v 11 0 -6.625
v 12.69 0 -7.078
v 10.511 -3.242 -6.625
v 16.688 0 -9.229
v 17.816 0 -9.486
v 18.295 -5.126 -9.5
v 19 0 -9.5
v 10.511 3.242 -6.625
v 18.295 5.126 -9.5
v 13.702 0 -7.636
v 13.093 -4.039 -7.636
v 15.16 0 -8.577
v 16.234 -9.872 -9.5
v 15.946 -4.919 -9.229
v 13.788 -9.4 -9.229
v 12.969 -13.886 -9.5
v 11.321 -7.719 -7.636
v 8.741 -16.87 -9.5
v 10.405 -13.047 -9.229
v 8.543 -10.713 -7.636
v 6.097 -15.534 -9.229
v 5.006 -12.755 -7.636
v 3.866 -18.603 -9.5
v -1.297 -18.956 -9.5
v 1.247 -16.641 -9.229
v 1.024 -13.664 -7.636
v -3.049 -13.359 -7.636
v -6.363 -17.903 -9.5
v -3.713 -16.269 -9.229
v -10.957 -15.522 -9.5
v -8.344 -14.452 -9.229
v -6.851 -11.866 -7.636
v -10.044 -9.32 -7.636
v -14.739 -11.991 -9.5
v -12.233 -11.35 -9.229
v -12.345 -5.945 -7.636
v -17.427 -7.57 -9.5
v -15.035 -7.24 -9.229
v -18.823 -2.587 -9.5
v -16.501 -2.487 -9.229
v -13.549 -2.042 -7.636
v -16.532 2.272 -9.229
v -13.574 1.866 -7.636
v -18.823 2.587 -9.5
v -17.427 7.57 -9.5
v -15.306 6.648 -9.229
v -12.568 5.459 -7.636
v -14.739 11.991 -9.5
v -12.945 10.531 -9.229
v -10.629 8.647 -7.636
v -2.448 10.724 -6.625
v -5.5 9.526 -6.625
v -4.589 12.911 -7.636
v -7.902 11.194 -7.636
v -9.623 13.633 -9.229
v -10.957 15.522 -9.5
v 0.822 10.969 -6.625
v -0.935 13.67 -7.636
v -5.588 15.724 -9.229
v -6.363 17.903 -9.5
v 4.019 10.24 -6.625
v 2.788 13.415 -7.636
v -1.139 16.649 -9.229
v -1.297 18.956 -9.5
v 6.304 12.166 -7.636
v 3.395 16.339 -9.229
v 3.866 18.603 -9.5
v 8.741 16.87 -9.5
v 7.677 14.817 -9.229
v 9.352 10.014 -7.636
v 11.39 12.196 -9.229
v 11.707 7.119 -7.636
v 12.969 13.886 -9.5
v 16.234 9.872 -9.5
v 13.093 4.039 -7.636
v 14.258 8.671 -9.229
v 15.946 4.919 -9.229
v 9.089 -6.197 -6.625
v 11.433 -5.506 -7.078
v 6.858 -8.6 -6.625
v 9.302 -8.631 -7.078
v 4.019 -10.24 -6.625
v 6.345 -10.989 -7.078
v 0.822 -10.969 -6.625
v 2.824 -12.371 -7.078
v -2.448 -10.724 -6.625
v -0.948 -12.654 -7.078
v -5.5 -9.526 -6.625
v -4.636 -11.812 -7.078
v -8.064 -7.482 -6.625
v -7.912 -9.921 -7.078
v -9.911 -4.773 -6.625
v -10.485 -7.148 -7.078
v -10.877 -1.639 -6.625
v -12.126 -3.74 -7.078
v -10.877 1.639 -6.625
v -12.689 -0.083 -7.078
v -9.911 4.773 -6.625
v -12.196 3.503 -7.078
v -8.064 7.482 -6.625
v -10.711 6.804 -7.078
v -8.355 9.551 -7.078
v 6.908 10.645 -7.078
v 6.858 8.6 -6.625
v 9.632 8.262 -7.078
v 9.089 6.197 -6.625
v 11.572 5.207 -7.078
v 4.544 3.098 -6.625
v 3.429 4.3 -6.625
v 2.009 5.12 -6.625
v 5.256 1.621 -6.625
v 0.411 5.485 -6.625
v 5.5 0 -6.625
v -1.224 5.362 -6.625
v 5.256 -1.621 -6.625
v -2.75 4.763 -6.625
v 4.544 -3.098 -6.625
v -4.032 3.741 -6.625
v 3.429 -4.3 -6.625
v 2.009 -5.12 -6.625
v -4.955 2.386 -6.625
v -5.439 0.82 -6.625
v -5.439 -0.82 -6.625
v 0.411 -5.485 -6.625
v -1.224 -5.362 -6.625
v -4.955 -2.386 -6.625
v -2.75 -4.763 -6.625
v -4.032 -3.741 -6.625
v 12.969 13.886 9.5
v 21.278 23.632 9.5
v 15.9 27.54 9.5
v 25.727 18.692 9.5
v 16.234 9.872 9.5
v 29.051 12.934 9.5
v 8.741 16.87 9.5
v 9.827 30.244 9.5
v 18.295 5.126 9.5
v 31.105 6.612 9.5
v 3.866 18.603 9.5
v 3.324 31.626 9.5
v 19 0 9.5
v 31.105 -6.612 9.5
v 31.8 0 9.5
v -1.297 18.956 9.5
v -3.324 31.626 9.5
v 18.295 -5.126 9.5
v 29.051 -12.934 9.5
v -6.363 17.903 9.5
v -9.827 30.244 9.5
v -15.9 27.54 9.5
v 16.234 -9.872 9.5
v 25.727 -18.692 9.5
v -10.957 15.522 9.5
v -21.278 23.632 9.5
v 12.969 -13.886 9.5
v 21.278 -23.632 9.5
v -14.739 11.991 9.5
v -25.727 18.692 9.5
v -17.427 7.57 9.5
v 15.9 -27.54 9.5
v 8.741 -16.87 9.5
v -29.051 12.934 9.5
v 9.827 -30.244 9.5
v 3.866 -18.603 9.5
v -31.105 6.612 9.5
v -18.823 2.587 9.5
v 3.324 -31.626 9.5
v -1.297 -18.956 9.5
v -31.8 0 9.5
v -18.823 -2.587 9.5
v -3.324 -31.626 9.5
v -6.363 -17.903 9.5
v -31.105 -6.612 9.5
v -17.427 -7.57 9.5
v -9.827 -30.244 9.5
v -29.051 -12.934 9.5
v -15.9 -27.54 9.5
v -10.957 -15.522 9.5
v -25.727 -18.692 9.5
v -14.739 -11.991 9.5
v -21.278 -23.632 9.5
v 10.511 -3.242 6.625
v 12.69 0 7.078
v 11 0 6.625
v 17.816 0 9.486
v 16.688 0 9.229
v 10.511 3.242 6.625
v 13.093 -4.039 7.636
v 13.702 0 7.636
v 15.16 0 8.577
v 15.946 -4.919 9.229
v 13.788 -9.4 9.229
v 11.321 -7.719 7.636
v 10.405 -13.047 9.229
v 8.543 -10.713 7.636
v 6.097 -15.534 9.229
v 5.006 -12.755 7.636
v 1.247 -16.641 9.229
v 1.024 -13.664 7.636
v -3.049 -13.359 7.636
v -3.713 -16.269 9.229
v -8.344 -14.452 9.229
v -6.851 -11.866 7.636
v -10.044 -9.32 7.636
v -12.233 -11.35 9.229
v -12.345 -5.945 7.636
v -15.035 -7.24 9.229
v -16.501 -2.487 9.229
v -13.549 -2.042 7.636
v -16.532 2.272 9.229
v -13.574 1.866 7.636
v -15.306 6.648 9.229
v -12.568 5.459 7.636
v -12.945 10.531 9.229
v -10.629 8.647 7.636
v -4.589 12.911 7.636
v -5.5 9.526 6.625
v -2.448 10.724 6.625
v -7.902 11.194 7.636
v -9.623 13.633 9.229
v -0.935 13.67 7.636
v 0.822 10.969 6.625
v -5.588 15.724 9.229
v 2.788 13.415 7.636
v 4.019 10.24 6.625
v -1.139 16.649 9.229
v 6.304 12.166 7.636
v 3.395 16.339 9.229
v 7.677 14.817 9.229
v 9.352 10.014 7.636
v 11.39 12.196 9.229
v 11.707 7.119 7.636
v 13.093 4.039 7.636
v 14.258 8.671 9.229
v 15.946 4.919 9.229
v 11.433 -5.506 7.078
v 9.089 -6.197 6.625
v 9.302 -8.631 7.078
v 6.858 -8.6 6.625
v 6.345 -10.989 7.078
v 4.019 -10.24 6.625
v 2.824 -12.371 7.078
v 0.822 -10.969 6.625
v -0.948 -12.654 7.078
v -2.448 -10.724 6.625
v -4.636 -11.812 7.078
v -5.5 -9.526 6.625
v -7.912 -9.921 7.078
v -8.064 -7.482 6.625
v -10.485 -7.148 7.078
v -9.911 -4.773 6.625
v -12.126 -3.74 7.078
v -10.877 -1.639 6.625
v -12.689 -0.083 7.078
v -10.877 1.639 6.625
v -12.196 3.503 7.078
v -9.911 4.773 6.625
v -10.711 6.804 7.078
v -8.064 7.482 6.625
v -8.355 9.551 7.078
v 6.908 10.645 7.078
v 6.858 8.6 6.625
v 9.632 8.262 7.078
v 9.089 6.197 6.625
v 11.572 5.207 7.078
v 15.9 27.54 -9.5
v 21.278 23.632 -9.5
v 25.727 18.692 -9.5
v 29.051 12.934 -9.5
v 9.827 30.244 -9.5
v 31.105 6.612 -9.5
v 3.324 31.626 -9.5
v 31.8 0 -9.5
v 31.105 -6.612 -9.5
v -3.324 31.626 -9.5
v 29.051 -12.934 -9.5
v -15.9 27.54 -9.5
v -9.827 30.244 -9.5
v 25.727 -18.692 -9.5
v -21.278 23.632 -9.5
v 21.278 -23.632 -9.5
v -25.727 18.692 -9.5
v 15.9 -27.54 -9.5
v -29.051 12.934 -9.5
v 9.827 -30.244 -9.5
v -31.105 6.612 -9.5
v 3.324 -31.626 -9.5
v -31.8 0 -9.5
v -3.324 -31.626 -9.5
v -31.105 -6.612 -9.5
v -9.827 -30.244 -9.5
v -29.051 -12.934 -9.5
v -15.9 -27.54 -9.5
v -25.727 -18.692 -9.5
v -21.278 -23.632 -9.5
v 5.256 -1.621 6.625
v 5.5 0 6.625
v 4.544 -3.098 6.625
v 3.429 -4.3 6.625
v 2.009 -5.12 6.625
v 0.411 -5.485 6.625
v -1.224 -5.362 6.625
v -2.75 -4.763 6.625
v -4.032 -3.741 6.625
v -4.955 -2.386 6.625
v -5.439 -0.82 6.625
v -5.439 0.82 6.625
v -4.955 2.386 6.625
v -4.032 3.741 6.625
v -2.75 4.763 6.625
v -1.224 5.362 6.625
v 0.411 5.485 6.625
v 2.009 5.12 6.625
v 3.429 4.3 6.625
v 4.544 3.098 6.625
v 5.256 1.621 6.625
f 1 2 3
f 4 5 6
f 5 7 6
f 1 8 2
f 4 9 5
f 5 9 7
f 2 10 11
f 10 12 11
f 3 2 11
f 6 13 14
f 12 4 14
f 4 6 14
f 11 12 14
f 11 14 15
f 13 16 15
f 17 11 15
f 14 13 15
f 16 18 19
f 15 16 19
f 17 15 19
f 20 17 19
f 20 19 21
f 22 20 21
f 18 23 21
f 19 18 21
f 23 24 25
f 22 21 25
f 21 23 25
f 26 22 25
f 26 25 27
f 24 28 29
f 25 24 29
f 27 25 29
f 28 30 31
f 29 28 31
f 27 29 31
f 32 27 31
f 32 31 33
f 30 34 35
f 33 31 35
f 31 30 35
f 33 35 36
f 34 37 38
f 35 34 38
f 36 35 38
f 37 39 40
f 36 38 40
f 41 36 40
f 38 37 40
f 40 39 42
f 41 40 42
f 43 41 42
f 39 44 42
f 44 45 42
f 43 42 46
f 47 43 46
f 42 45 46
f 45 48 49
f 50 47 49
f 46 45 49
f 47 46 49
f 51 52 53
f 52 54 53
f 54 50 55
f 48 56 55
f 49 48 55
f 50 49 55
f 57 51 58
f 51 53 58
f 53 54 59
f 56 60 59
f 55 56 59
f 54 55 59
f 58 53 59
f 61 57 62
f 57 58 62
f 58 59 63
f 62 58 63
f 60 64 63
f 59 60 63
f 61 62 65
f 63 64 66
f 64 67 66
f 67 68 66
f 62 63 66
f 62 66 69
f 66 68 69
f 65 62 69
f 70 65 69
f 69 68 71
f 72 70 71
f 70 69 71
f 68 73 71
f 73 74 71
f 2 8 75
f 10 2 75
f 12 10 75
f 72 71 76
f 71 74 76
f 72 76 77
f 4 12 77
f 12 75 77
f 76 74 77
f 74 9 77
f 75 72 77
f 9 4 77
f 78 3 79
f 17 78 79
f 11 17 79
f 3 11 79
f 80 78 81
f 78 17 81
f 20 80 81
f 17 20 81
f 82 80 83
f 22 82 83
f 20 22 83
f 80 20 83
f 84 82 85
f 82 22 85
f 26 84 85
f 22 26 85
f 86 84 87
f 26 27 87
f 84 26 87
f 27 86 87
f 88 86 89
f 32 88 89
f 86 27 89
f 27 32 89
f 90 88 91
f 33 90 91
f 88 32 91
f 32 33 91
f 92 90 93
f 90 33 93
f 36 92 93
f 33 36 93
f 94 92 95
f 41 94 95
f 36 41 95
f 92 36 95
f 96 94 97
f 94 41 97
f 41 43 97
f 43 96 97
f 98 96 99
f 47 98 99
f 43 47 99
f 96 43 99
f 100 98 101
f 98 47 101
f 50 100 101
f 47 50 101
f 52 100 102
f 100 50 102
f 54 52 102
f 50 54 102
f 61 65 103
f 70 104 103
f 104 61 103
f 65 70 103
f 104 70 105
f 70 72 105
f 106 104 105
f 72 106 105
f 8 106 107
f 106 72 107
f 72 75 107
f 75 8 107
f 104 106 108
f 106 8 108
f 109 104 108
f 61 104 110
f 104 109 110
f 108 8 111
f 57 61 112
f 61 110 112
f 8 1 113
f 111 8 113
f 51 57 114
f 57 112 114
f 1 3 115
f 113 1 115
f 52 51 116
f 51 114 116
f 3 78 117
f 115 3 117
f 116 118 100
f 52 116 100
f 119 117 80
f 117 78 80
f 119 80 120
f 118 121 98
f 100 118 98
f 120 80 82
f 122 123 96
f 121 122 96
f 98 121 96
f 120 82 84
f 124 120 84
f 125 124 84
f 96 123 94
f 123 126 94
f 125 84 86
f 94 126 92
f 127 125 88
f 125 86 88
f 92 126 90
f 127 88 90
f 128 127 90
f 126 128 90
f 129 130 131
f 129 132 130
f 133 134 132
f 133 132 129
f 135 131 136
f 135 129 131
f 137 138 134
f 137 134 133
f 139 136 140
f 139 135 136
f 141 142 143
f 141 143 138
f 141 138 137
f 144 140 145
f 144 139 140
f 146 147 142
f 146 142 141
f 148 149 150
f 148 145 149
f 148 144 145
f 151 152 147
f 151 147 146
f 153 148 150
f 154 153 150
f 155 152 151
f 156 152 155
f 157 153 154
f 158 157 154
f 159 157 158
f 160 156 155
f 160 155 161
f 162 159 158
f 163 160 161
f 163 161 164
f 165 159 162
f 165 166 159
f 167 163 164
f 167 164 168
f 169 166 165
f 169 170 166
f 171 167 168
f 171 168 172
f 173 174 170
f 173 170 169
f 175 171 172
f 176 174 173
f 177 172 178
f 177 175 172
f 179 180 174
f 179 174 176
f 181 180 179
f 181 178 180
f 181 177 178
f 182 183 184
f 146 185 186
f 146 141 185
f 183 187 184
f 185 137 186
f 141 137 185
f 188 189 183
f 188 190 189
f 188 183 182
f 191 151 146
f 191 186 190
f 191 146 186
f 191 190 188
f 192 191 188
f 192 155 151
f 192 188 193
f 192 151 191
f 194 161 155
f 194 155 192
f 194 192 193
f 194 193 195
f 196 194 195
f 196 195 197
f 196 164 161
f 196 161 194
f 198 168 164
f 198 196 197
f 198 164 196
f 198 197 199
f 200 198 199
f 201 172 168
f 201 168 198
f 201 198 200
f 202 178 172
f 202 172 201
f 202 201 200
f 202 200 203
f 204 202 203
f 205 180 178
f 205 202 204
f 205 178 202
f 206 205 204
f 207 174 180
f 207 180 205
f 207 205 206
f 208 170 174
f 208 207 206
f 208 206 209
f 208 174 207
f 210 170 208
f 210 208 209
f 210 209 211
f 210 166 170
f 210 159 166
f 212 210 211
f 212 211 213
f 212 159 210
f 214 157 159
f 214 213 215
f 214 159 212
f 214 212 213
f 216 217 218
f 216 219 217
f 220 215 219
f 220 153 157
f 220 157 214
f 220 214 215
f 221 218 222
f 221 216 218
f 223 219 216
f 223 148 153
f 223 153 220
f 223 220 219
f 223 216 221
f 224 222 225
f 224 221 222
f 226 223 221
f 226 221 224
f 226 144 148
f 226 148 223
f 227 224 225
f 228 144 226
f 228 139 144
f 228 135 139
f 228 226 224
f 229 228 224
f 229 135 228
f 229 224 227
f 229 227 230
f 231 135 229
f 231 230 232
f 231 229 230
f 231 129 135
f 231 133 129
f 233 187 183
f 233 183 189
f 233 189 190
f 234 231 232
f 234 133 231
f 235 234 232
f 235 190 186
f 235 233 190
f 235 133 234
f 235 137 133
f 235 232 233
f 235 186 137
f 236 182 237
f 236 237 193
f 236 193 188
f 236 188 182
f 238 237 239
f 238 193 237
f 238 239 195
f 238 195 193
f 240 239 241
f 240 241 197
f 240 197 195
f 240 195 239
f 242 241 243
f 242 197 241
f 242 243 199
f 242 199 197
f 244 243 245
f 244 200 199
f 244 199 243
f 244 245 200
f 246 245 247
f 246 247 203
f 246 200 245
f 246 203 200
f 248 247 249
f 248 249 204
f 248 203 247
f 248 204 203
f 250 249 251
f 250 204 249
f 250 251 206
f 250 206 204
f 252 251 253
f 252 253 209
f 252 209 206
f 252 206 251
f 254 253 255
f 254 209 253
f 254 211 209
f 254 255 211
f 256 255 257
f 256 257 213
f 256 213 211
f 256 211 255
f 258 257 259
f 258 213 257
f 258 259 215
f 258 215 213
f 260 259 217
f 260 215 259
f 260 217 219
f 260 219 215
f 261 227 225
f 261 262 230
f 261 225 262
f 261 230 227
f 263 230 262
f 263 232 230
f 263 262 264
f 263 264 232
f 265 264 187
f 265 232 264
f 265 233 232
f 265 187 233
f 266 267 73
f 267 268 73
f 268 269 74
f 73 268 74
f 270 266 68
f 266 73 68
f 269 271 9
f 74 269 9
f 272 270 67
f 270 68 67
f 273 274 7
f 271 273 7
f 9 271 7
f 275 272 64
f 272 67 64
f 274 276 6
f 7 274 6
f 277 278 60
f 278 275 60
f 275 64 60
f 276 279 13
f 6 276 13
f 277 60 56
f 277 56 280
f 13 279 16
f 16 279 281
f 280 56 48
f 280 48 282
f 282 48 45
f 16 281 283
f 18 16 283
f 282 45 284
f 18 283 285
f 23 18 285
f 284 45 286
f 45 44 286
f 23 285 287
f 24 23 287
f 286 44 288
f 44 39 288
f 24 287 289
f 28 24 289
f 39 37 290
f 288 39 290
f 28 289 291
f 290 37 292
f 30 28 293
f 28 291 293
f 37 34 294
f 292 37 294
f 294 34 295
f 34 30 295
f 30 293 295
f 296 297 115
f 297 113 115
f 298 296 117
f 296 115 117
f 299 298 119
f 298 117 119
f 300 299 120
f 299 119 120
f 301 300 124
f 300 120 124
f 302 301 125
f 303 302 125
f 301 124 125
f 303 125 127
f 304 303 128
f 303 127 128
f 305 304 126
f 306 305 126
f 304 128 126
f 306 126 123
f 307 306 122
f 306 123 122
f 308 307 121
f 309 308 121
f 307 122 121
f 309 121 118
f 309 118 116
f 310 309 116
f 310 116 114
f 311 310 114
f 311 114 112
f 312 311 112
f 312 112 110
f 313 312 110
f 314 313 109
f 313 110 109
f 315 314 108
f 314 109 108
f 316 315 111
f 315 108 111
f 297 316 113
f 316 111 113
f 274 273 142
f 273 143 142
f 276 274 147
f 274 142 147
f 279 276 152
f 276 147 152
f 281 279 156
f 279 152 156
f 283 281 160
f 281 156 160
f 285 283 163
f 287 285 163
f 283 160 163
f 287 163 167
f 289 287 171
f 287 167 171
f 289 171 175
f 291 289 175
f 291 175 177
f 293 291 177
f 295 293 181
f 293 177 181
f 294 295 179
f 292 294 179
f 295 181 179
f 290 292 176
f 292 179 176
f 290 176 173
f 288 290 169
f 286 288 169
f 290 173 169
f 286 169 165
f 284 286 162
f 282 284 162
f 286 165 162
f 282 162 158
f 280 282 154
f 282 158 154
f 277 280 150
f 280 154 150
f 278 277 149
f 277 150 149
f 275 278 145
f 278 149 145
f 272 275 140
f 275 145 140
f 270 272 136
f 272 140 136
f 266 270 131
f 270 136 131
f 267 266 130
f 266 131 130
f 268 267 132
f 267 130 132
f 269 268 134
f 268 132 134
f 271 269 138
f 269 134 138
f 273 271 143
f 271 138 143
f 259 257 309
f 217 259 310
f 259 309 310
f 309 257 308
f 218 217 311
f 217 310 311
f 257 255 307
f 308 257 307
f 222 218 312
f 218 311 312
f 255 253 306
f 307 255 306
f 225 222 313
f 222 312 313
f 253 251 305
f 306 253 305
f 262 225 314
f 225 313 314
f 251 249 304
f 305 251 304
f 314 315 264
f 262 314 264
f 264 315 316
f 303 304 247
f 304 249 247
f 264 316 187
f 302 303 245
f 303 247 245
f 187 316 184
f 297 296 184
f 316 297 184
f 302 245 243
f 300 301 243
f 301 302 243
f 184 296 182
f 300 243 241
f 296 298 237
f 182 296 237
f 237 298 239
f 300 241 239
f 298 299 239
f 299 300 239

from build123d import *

# Parameters (mm, degrees)
F0_W = 12.8
F0_H = 19


with BuildPart() as f1:
    # F0 (on Front) → F1 (revolve)
    with BuildSketch(Plane.XZ):
        with BuildLine():
            Line((11, 6.625), (5.5, 6.625))
            Line((5.5, 6.625), (5.5, -6.625))
            Line((5.5, -6.625), (11, -6.625))
            add(Edge.make_bspline(
                [(11, -6.625), (12.4770218782, -6.8073266533), (13.8361511082, -7.7060788567), (14.2416545495, -8.0680834721), (16.9917661697, -9.7409561276), (19, -9.5)],
                knots=[0, 0, 0, 0, 0.3689001328, 0.5280858278, 1, 1, 1, 1], degree=3))
            Line((19, -9.5), (19, 9.5))
            add(Edge.make_bspline(
                [(11, 6.625), (12.4770218782, 6.8073266533), (13.8361511082, 7.7060788567), (14.2416545495, 8.0680834721), (16.9917661697, 9.7409561276), (19, 9.5)],
                knots=[0, 0, 0, 0, 0.3689001328, 0.5280858278, 1, 1, 1, 1], degree=3))
        make_face()
        with Locations((25.4, 0)):
            Rectangle(F0_W, F0_H)
    revolve(axis=Axis((0, 0, -0.4735022907), (0, 0, -1)))


solid = f1.part
